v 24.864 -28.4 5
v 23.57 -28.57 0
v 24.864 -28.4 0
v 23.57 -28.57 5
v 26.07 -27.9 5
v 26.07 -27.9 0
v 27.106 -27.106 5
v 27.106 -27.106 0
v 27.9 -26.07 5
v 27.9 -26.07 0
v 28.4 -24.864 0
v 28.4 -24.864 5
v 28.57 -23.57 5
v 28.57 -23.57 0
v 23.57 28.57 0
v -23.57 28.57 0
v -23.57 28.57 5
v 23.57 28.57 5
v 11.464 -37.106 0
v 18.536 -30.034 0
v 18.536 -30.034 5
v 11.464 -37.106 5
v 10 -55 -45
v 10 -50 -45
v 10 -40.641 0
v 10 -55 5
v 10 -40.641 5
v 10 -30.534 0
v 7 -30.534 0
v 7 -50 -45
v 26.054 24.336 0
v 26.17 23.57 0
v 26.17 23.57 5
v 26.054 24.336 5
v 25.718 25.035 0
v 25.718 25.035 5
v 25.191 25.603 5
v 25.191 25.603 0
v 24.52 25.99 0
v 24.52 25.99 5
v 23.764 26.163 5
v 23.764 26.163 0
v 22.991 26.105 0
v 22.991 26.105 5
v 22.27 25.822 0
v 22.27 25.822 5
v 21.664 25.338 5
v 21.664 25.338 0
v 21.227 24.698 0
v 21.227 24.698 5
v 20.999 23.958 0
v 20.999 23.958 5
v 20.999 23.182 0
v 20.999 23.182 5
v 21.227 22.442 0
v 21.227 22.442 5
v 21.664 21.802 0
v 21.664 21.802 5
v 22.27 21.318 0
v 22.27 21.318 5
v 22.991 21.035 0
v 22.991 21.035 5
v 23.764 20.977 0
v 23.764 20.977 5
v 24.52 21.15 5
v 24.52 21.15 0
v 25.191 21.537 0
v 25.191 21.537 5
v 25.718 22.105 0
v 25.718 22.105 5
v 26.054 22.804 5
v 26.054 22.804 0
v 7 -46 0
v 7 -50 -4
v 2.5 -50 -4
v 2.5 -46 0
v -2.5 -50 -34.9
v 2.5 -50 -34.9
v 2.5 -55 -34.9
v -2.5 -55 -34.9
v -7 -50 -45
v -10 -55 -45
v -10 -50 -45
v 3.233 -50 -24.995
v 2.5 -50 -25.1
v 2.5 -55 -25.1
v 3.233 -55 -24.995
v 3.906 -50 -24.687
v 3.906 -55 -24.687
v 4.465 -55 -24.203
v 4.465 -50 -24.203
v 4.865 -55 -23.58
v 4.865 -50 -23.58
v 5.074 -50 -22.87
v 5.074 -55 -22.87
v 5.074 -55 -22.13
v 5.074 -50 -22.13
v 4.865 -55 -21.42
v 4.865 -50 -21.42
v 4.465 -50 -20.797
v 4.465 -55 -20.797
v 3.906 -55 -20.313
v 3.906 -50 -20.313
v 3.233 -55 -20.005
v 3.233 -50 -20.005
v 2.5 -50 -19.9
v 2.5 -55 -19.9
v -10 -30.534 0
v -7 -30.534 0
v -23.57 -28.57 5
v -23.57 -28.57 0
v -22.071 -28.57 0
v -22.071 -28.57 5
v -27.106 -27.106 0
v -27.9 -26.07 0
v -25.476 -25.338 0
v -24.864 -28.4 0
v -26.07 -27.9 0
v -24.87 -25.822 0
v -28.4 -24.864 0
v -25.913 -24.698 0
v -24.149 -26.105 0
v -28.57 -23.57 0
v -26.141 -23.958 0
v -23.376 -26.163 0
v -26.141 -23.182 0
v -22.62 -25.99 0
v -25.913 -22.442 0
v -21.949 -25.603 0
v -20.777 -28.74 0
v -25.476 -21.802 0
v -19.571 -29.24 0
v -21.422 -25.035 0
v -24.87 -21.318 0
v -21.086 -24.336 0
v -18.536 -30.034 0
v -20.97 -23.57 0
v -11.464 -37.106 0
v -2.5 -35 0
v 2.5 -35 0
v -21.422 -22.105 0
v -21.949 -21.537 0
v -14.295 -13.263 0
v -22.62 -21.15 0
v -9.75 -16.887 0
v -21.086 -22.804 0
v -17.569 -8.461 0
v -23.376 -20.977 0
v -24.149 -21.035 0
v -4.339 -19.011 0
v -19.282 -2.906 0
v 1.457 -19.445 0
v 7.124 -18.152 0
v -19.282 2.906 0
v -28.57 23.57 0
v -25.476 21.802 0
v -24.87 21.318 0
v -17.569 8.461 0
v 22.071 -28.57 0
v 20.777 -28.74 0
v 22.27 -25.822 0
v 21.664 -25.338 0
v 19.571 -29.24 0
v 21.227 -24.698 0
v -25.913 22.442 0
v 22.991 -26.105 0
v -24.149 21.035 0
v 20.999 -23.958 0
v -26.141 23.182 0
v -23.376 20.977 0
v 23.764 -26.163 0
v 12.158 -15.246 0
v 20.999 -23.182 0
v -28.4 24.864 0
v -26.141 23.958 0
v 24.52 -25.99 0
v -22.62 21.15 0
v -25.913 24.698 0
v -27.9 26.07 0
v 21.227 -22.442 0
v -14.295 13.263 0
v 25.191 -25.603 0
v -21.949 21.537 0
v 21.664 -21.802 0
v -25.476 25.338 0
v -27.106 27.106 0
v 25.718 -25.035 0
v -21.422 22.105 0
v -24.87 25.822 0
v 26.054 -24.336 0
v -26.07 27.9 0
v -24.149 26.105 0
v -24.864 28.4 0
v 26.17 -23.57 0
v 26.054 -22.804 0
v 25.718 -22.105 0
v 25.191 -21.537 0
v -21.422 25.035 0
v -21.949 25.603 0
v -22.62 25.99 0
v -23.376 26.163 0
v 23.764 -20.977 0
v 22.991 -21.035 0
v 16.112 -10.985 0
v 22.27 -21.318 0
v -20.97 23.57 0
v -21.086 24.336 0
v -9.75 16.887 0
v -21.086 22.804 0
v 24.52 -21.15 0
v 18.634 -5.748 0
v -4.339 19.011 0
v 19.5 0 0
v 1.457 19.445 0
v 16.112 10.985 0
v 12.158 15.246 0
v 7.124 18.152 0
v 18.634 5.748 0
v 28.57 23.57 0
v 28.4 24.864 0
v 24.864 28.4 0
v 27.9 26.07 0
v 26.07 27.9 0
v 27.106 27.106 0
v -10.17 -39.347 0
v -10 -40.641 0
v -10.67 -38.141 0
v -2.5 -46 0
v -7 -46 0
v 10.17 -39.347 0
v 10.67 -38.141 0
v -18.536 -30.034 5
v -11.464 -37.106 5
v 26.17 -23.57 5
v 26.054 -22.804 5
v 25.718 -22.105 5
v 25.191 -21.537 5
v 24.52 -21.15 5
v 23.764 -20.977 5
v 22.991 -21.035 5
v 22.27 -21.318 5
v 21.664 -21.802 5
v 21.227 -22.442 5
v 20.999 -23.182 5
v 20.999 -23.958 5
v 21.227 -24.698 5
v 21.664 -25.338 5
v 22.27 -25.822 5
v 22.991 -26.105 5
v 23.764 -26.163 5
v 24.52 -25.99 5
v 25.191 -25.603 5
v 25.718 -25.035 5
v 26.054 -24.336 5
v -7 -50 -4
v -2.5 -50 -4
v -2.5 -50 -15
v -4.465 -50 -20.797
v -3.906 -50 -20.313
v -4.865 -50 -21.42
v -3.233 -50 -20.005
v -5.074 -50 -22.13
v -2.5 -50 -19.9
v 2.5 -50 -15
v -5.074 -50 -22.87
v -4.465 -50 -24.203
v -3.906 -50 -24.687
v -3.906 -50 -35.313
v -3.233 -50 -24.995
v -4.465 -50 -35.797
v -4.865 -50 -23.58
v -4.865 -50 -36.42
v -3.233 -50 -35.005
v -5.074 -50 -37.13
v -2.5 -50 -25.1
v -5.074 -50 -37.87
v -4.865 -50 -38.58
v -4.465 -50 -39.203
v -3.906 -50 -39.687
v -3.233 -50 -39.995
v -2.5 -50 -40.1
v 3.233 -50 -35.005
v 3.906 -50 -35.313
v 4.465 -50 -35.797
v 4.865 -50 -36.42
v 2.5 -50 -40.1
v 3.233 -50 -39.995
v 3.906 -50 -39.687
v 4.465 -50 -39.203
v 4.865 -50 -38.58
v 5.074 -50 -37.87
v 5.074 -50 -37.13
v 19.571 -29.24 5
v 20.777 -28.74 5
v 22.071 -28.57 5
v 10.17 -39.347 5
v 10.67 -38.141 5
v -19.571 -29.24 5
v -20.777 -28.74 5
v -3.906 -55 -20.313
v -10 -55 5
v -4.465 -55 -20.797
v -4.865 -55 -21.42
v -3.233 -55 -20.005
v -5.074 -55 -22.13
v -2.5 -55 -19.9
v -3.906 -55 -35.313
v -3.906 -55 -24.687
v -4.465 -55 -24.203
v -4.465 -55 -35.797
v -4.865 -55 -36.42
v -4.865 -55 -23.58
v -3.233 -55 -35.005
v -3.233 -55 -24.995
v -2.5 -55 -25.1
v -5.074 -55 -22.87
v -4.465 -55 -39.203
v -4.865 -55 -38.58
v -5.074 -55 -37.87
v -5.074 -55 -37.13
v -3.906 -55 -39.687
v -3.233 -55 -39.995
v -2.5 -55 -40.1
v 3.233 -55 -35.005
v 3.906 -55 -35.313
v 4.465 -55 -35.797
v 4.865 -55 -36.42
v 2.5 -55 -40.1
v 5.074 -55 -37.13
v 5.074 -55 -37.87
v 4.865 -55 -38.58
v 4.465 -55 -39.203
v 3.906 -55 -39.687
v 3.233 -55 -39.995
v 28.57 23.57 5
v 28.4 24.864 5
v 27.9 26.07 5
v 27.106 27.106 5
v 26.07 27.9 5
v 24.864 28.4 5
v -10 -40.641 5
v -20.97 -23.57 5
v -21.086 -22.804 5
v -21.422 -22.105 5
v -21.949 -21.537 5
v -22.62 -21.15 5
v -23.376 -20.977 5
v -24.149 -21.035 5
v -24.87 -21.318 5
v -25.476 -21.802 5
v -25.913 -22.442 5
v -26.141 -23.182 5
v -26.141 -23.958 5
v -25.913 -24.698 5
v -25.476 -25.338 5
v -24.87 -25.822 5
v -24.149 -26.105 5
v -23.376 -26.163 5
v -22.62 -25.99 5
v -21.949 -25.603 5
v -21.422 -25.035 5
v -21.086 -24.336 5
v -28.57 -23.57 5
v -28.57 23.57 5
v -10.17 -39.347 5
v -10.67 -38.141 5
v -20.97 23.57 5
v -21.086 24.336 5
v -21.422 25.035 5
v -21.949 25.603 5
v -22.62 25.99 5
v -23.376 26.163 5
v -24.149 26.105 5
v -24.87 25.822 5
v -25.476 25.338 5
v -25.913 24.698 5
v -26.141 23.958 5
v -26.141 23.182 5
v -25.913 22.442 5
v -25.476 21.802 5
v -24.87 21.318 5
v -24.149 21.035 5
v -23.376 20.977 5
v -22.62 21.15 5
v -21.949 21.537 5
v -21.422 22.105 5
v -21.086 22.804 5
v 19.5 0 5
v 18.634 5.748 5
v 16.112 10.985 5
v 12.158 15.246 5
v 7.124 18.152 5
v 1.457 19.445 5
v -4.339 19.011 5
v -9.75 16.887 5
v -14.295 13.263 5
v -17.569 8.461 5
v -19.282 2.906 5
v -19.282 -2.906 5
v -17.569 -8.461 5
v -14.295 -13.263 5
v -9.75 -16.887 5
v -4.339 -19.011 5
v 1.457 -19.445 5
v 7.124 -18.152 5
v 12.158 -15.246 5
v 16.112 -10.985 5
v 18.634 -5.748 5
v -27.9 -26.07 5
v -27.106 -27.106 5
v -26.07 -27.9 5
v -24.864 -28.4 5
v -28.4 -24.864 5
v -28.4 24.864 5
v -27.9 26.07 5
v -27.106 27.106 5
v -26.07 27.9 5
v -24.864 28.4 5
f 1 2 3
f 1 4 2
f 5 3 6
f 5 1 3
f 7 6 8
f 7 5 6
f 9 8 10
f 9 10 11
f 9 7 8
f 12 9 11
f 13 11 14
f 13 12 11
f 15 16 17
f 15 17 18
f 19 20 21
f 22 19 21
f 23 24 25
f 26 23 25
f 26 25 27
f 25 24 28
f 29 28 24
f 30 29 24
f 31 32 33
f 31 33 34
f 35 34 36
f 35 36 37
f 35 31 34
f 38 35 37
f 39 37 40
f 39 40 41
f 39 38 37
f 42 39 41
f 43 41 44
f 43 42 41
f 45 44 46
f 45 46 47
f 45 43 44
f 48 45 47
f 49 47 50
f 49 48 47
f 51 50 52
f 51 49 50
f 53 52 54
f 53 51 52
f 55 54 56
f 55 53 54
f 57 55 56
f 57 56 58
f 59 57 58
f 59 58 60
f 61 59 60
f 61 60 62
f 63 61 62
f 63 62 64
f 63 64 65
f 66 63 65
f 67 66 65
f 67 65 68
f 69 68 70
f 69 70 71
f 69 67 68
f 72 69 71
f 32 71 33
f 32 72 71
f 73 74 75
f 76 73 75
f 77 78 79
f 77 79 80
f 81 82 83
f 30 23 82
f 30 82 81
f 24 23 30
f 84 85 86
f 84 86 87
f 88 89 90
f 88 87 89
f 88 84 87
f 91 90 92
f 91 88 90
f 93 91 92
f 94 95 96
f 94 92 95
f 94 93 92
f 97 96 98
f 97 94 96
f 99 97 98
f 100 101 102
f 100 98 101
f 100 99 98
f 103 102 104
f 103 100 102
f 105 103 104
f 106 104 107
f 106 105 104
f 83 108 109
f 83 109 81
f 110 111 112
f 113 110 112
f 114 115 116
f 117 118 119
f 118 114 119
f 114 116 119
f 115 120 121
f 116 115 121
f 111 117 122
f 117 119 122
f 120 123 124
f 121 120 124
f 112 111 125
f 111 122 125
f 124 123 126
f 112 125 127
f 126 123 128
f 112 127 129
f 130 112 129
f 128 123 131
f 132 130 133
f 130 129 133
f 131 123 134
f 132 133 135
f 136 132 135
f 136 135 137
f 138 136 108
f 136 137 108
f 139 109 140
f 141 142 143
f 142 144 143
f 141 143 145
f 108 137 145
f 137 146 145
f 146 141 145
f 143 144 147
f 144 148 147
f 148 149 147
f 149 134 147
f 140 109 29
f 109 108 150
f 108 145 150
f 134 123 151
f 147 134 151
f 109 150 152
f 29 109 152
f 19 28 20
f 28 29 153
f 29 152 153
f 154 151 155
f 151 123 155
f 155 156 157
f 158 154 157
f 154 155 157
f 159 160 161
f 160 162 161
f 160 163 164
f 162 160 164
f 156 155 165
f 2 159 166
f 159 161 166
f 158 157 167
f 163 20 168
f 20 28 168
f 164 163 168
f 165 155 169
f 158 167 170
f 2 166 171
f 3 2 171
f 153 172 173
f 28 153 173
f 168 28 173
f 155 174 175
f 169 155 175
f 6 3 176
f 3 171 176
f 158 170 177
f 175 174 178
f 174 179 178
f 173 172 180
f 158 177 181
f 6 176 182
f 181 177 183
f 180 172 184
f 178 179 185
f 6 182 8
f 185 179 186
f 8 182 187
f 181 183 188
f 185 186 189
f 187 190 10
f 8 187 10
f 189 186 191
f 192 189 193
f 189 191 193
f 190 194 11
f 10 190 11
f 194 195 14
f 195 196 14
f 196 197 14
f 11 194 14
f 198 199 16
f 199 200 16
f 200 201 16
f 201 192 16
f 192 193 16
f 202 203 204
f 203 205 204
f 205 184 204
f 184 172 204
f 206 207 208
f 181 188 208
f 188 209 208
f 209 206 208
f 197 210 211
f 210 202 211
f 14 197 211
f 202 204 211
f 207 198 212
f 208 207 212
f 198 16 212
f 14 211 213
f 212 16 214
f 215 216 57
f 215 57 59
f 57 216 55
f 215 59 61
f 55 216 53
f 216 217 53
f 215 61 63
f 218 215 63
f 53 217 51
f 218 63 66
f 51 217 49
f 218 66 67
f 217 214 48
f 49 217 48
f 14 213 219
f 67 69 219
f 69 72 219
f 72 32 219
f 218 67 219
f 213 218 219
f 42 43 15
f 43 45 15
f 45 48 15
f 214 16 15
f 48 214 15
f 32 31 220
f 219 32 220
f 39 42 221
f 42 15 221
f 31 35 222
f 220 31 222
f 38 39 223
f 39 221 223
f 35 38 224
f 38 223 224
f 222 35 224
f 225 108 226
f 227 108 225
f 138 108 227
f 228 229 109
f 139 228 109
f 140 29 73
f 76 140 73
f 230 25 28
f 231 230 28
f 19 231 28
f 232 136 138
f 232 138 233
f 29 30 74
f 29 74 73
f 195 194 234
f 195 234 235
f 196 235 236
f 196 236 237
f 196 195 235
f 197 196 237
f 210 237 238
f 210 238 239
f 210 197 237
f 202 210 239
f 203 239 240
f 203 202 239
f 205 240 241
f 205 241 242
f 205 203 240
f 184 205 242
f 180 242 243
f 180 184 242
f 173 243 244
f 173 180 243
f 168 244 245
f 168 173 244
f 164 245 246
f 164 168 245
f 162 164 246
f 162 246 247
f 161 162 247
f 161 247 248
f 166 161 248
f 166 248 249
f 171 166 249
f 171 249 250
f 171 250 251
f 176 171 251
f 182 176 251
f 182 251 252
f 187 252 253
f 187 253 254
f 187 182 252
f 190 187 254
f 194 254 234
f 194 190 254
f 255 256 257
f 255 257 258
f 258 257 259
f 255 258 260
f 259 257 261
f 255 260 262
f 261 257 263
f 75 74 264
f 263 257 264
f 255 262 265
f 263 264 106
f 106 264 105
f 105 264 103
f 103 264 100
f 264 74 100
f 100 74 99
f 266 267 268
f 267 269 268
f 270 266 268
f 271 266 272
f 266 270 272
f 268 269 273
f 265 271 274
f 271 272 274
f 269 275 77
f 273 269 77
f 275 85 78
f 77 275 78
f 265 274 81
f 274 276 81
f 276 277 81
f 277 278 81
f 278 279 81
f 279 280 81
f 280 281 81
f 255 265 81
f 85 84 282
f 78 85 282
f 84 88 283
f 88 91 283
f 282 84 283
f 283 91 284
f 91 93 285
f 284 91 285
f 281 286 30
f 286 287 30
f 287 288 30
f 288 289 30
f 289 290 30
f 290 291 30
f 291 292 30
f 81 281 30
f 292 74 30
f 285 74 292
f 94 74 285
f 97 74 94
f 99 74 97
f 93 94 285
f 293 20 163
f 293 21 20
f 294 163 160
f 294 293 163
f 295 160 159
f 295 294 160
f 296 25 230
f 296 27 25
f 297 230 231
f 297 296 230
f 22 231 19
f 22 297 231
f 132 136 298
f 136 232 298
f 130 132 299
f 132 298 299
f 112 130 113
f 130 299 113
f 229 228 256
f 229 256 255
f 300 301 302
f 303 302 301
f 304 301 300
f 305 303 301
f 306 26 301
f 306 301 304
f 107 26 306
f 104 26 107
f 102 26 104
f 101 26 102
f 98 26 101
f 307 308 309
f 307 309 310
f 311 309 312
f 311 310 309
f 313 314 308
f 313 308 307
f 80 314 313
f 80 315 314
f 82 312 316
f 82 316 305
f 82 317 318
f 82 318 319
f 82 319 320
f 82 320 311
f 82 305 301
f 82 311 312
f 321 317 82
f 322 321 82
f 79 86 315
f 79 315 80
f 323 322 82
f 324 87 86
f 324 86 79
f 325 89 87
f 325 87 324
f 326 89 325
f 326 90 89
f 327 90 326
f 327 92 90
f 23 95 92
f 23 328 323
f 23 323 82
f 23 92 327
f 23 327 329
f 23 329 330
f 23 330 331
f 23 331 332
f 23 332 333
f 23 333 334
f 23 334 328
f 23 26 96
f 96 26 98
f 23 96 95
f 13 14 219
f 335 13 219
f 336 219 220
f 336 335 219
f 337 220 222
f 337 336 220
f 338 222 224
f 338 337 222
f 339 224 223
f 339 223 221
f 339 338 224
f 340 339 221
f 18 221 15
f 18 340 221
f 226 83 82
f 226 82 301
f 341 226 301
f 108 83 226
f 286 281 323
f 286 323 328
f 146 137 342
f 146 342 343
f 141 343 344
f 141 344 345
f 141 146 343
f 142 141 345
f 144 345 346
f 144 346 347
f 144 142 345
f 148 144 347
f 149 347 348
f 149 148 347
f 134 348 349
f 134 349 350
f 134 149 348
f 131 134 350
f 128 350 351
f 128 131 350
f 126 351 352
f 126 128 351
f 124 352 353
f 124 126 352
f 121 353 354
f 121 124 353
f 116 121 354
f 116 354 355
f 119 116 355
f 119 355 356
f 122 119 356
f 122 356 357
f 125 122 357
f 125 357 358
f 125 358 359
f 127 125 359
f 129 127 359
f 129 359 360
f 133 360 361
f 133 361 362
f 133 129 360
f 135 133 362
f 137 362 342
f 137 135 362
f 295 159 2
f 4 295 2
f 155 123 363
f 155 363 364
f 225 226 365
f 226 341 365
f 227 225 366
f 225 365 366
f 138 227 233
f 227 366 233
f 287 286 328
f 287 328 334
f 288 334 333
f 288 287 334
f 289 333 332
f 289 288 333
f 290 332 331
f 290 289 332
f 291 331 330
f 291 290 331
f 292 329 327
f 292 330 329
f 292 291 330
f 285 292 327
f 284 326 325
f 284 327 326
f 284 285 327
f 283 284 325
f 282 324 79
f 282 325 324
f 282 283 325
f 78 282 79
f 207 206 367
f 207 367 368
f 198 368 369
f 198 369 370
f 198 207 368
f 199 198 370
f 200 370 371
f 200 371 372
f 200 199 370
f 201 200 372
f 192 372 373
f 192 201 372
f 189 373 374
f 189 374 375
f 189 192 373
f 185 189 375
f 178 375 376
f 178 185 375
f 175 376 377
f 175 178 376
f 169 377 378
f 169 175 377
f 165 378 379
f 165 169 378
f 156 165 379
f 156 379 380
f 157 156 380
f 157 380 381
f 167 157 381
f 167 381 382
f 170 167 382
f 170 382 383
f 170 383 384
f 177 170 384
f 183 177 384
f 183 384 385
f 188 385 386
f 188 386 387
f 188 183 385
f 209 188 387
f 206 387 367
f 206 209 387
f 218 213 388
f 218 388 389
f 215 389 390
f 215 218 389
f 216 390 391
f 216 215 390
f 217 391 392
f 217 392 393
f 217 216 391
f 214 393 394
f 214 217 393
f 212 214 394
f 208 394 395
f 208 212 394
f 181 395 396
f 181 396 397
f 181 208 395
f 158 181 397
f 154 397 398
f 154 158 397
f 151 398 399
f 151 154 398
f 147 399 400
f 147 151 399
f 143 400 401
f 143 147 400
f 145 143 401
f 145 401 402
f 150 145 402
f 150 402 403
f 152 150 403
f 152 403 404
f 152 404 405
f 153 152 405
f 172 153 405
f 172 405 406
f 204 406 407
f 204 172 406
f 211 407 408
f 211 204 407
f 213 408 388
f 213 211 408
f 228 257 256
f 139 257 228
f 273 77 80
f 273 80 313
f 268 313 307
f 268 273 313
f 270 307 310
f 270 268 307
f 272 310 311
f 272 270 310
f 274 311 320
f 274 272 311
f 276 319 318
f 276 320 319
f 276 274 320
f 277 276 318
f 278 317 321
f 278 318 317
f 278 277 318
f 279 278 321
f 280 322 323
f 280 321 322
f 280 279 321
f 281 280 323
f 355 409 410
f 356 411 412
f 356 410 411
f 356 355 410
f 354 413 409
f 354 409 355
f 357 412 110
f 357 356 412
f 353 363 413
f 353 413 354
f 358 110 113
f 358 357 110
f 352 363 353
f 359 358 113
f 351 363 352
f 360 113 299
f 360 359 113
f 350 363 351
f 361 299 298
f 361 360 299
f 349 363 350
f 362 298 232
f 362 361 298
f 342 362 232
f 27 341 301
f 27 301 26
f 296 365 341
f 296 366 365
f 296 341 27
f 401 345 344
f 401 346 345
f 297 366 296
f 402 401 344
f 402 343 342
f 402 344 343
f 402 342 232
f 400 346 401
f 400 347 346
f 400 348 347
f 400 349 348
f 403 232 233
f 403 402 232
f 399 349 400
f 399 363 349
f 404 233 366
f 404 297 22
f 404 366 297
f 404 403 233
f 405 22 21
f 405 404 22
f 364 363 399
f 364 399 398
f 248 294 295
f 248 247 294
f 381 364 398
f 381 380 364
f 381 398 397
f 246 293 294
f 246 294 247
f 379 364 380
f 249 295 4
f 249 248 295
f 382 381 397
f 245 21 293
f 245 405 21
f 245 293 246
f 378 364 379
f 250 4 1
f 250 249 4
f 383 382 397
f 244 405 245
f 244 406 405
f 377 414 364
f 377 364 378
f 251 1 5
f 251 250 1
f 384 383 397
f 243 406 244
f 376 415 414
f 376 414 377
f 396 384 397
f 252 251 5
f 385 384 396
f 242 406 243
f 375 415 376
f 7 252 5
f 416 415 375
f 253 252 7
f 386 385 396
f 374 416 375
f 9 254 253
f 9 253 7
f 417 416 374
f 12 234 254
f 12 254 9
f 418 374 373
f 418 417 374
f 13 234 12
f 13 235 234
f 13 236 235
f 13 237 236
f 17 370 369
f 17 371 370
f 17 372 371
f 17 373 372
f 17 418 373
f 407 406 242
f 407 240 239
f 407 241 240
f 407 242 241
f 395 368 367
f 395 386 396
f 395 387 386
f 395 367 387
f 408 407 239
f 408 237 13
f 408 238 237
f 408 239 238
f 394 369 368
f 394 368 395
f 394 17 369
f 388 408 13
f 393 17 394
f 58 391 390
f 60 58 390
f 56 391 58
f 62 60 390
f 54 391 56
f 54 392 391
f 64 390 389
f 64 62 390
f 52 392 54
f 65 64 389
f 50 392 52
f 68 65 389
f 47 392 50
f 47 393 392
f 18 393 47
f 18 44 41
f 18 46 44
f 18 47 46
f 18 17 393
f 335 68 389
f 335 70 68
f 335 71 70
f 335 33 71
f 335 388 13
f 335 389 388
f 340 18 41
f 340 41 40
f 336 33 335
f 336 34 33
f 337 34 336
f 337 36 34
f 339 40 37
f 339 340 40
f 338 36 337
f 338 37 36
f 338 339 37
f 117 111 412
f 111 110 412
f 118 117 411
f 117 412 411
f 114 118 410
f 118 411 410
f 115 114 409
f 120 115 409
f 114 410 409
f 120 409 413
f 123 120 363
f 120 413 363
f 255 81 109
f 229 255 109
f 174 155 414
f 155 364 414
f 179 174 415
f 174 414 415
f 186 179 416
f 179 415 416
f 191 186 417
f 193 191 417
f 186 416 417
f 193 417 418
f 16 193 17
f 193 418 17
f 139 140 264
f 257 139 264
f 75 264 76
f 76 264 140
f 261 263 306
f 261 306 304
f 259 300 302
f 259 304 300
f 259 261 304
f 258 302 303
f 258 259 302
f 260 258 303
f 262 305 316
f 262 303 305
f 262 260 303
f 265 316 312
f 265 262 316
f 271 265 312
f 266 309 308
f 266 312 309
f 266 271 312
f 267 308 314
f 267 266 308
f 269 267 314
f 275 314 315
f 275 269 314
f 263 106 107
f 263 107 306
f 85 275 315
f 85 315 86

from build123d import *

# Parameters (mm, degrees)
SKETCH1_W           = 57.14
SKETCH1_H           = 57.14
SKETCH1_R           = 19.5
SKETCH1_R_2         = 2.6
SKETCH1_W_2         = 20
SKETCH1_H_2         = 26.43
BOSS_EXTRUDE1_DEPTH = 5
SKETCH3_W           = 45
SKETCH3_H           = 5
BOSS_EXTRUDE2_DEPTH = 20
BOSS_EXTRUDE3_START = -7.5
BOSS_EXTRUDE3_DEPTH = 5
CUT_EXTRUDE1_REACH  = 96.945
FILLET1_R           = 5
CHAMFER1_SIZE       = 4
CHAMFER2_SIZE       = 10
FILLET2_R           = 5
BOSS_EXTRUDE4_DEPTH = 3


with BuildPart() as part:
    # Sketch1 → Boss-Extrude1 (new body)
    # profile 1 of 2: a face of its own
    with BuildSketch(Plane.XY):
        Rectangle(SKETCH1_W, SKETCH1_H)
        Circle(SKETCH1_R, mode=Mode.SUBTRACT)
        with Locations((-23.57, -23.57)):
            Circle(SKETCH1_R_2, mode=Mode.SUBTRACT)
        with Locations((23.57, -23.57)):
            Circle(SKETCH1_R_2, mode=Mode.SUBTRACT)
        with Locations((23.57, 23.57)):
            Circle(SKETCH1_R_2, mode=Mode.SUBTRACT)
        with Locations((-23.57, 23.57)):
            Circle(SKETCH1_R_2, mode=Mode.SUBTRACT)
    # profile 2 of 2: a face of its own
    with BuildSketch(Plane.XY):
        with Locations((0, -41.785)):
            Rectangle(SKETCH1_W_2, SKETCH1_H_2)
    extrude(amount=BOSS_EXTRUDE1_DEPTH)

    # Sketch3 → Boss-Extrude2 (add)
    with BuildSketch(Plane(origin=(10, 0, 0), x_dir=(0, 0, -1), z_dir=(1, 0, 0))):
        with Locations((22.5, -52.5)):
            Rectangle(SKETCH3_W, SKETCH3_H)
    extrude(amount=-BOSS_EXTRUDE2_DEPTH)

    # Sketch5 → Boss-Extrude3 (add)
    with BuildSketch(Plane(origin=(10, 0, 0), x_dir=(0, 0, -1), z_dir=(1, 0, 0)).offset(BOSS_EXTRUDE3_START)):
        Polygon((0, -35), (15, -50), (0, -50), align=None)
    extrude(amount=-BOSS_EXTRUDE3_DEPTH)

    # Sketch4 → Cut-Extrude1 (cut, up to next)
    with BuildSketch(Plane(origin=(0, -50, 0), x_dir=(1, 0, 0), z_dir=(0, 1, 0)), mode=Mode.PRIVATE) as cut_extrude1_sk1:
        with BuildLine():
            Line((-2.5, 40.1), (2.5, 40.1))
            ThreePointArc((2.5, 40.1), (5.1, 37.5), (2.5, 34.9))
            Line((2.5, 34.9), (-2.5, 34.9))
            ThreePointArc((-2.5, 34.9), (-5.1, 37.5), (-2.5, 40.1))
        make_face()
    cut_extrude1_tool1 = extrude(cut_extrude1_sk1.sketch, amount=-CUT_EXTRUDE1_REACH, mode=Mode.PRIVATE) & part.part
    # Sketch4 → Cut-Extrude1 (cut, up to next)
    with BuildSketch(Plane(origin=(0, -50, 0), x_dir=(1, 0, 0), z_dir=(0, 1, 0)), mode=Mode.PRIVATE) as cut_extrude1_sk2:
        with BuildLine():
            Line((-2.5, 25.1), (2.5, 25.1))
            ThreePointArc((2.5, 25.1), (5.1, 22.5), (2.5, 19.9))
            Line((2.5, 19.9), (-2.5, 19.9))
            ThreePointArc((-2.5, 19.9), (-5.1, 22.5), (-2.5, 25.1))
        make_face()
    cut_extrude1_tool2 = extrude(cut_extrude1_sk2.sketch, amount=-CUT_EXTRUDE1_REACH, mode=Mode.PRIVATE) & part.part
    add(cut_extrude1_tool1.solids().sort_by_distance((0, -50, -37.5))[0], mode=Mode.SUBTRACT)
    add(cut_extrude1_tool2.solids().sort_by_distance((0, -50, -22.5))[0], mode=Mode.SUBTRACT)

    # Fillet1
    fillet1_edges = [part.edges().sort_by_distance(p)[0] for p in [
        (28.57, -28.57, 2.5),
        (-28.57, -28.57, 2.5),
        (-28.57, 28.57, 2.5),
        (28.57, 28.57, 2.5),
    ]]
    fillet(fillet1_edges, radius=FILLET1_R)

    # Chamfer1
    chamfer1_edges = [part.edges().sort_by_distance(p)[0] for p in [
        (-6.25, -50, 0),
        (6.25, -50, 0),
    ]]
    chamfer(chamfer1_edges, length=CHAMFER1_SIZE)

    # Chamfer2
    chamfer2_edges = [part.edges().sort_by_distance(p)[0] for p in [
        (10, -28.57, 2.5),
        (-10, -28.57, 2.5),
    ]]
    chamfer(chamfer2_edges, length=CHAMFER2_SIZE)

    # Fillet2
    fillet2_edges = [part.edges().sort_by_distance(p)[0] for p in [
        (-10, -38.57, 2.5),
        (-20, -28.57, 2.5),
        (20, -28.57, 2.5),
        (10, -38.57, 2.5),
    ]]
    fillet(fillet2_edges, radius=FILLET2_R)

    # Sketch6 → Boss-Extrude4 (add)
    with BuildSketch(Plane(origin=(10, 0, 0), x_dir=(0, 0, -1), z_dir=(1, 0, 0))):
        Polygon((45, -50), (4, -50), (0, -46), (0, -30.534466094), align=None)
    boss_extrude4 = extrude(amount=-BOSS_EXTRUDE4_DEPTH)

    # Mirror1: Boss-Extrude4 across plane
    add(boss_extrude4.mirror(Plane(origin=(0, 0, 0), x_dir=(0, 0, 1), z_dir=(1, 0, 0))))


solid = part.part
